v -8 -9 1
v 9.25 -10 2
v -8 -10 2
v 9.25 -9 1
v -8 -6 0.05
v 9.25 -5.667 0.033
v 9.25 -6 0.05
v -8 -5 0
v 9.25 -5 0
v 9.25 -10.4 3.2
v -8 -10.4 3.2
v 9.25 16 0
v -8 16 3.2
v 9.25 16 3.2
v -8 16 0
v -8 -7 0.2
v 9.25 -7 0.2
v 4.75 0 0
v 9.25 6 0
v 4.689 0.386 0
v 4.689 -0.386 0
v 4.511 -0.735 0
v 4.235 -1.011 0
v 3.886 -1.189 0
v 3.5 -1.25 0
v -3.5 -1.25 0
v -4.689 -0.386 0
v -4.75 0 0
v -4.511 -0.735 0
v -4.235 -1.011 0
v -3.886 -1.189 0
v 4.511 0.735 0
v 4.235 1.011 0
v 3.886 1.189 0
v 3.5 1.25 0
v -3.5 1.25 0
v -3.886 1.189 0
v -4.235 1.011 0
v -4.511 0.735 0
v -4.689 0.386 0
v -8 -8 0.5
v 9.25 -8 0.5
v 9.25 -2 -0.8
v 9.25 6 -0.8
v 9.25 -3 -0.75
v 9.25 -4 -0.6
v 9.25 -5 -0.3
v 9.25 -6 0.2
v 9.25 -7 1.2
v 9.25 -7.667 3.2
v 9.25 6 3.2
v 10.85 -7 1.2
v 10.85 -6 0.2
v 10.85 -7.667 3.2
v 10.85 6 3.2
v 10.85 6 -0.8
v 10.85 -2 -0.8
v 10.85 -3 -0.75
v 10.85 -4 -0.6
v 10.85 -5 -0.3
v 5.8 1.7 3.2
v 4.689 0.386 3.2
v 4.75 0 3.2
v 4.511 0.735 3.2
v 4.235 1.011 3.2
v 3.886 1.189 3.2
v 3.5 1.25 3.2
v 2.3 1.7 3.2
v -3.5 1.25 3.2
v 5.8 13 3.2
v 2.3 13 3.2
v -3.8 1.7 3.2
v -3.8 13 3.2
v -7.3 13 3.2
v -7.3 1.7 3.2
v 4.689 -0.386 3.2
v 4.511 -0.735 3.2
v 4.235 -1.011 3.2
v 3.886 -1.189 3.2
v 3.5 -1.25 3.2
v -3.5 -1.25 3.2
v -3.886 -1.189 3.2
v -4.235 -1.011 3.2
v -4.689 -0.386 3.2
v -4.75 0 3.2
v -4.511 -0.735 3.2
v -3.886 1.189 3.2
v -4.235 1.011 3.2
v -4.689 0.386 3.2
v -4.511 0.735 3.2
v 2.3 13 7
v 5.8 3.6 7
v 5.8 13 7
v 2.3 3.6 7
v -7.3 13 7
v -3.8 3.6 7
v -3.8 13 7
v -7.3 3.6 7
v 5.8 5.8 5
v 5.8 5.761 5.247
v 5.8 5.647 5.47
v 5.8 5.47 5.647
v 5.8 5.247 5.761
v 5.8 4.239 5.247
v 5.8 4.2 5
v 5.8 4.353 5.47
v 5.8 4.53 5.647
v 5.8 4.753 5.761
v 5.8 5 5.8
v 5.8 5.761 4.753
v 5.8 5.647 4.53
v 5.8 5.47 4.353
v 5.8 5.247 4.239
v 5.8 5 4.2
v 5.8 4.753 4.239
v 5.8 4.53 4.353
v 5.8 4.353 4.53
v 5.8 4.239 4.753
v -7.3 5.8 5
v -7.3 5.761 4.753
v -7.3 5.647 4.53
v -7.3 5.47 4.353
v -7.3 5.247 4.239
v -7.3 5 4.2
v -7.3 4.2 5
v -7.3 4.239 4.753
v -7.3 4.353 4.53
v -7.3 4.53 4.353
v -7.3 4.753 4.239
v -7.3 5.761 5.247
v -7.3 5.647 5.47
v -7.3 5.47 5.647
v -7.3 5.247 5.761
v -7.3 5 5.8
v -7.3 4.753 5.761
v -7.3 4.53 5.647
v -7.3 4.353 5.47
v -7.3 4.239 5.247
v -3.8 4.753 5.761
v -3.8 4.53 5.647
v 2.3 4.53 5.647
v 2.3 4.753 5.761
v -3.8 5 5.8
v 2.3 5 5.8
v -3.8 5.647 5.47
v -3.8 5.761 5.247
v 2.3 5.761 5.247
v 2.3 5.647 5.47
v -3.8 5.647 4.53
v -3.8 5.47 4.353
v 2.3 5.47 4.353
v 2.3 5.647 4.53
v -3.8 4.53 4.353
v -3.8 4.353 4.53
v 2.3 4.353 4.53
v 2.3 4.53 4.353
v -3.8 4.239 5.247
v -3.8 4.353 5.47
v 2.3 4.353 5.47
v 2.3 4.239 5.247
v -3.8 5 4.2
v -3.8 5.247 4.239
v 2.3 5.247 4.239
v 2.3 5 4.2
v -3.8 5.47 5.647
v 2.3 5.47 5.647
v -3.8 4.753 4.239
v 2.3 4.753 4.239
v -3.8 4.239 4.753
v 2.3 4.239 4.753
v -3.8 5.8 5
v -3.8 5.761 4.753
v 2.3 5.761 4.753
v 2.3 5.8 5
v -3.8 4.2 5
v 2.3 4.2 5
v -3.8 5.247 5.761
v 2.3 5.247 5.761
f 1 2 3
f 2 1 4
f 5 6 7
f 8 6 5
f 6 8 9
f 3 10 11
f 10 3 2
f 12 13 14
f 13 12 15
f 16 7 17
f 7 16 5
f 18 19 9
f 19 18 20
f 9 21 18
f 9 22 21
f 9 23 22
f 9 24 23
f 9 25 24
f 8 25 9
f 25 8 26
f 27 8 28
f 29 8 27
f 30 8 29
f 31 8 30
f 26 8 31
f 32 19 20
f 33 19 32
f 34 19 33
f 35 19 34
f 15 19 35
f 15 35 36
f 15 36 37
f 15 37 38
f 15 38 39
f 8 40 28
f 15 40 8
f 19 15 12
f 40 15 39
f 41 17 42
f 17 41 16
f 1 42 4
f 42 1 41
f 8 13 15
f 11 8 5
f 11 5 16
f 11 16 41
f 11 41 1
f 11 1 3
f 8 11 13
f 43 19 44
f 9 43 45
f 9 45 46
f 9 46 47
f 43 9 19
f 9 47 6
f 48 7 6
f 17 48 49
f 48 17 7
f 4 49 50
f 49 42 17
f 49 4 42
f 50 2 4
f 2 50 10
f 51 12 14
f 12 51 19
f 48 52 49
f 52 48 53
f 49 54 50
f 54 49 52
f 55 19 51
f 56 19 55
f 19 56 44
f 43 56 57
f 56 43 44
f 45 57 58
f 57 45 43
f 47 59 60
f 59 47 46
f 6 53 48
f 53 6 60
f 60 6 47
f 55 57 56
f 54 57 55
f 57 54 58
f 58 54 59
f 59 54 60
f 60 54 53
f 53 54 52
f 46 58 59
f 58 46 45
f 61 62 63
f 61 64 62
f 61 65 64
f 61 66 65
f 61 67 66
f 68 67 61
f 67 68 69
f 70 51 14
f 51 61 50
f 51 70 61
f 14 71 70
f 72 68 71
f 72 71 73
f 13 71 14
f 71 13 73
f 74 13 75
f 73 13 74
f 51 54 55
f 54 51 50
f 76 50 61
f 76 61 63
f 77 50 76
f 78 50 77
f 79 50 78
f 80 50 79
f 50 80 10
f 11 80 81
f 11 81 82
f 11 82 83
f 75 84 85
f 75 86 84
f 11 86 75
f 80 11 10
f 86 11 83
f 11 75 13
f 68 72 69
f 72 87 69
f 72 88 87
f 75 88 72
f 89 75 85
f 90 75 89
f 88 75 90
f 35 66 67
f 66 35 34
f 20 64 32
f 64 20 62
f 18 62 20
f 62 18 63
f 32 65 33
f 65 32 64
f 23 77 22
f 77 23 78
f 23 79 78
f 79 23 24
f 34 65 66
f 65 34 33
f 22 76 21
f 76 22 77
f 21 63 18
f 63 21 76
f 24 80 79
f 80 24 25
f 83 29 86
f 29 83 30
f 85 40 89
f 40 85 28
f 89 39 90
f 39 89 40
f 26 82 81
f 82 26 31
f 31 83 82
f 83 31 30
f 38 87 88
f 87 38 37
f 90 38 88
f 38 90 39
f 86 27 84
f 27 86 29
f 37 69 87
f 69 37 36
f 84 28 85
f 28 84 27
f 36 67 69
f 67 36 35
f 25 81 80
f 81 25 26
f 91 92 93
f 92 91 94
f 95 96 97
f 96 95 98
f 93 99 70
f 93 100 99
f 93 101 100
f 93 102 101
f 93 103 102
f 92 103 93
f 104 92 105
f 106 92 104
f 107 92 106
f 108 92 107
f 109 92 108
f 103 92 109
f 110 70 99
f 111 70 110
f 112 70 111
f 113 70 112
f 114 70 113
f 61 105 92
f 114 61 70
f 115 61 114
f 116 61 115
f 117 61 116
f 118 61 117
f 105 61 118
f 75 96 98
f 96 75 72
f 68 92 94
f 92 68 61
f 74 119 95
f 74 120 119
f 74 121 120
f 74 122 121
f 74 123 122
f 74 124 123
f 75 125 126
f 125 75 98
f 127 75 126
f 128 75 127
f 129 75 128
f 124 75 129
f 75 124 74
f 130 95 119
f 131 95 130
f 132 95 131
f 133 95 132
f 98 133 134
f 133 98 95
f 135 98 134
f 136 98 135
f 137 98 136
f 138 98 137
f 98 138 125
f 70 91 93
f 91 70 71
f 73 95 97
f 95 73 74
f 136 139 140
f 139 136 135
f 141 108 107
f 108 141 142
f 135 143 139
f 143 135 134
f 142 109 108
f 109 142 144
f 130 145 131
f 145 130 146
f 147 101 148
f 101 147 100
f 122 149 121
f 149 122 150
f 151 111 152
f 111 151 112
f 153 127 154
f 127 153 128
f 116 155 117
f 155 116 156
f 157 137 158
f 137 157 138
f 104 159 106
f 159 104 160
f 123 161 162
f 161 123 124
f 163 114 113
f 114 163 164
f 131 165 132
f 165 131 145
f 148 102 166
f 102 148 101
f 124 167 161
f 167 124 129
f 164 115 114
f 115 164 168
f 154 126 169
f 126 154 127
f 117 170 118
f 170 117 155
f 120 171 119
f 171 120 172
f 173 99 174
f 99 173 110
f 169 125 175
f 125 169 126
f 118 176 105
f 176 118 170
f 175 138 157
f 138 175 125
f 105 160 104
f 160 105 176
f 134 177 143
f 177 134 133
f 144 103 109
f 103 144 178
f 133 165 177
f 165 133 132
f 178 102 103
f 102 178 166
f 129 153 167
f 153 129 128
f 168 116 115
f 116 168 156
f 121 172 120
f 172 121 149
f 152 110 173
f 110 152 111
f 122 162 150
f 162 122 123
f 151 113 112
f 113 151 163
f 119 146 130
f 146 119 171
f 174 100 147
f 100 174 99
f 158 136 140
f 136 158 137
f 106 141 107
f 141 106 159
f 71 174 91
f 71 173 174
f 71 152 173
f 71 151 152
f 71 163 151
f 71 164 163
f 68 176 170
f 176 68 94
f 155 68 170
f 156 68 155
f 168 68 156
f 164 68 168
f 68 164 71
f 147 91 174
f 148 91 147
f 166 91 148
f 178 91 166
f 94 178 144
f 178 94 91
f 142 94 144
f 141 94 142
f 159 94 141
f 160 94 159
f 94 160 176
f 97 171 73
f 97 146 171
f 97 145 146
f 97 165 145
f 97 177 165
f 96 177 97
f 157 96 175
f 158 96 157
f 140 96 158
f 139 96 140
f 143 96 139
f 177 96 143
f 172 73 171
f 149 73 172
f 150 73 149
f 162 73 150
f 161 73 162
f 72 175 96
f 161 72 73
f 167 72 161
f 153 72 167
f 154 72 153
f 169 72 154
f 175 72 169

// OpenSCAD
// file: guided_sewing_foot_template.scad
// The diameter of the MATIC rod
matic_rod_diameter = 1.6;

// The height at which the MATIC rod is placed over the plate (the least strict parameter, as the foot is amortized)
matic_rod_dz = 5.0; 

// The Y offset between the MATIC rod and the needle
matic_offset_dy = 5.0;

// The total width of the MATIC handle (including allowance)
matic_handle_width = 6.1; 

// The X offset between the needle and the center of the MATIC handle on Janome machines with a maximum stitch width of 7 mm 
janome_matic_offset_dx = -0.75;

// The width of the transport mechanism in the Janome machines
janome_transport_width = 16.0;

needle_tunnel_length_max = 7.0;
needle_tunnel_margin = 4.0;

foot_base_leftside_width = janome_transport_width / 2;
foot_base_rightside_width_full = janome_transport_width / 2;

guide_min_width = 1.6;
ear_width = 3.5;

foot_base_height = 3.2;

primary_front_length = 5.0;
primary_back_length = 16.0;

short_guide_front_length = 2.0;
short_guide_back_length = 6.0;

ears_piece_width = matic_handle_width + ear_width * 2;
right_ear_edge_x = janome_matic_offset_dx + matic_handle_width / 2 + ear_width;

module reflection(
    mirror_vector = [1, 0, 0]
) {
    union() {
        children();
        mirror(mirror_vector) {
            children();
        }
    }
}

module make_wing(
    width,
    front_length,
    back_length,
) {
    h_max = 5.0;
    dx = 1;
    
    rotate([180, -90, 0])
    linear_extrude(height=width)
    polygon(
        points=[
            [h_max, -back_length],
            [0, -back_length],
            [0.00, front_length + dx * 0],
            [0.05, front_length + dx * 1],
            [0.20, front_length + dx * 2],
            [0.50, front_length + dx * 3],
            [1.00, front_length + dx * 4],
            [2.00, front_length + dx * 5],
            [h_max, front_length + dx * 6]
        ],
        paths=[
            [0, 1, 2, 3, 4, 5, 6, 7, 8],
        ]
    );
}

module top_cutter_global() {
    a = 40;
    h = 20;
    
    translate([-a / 2, -a / 2, foot_base_height])
    cube([a, a, h]);
}

module ears_piece_base_local() {
    back_length = 8.0;
    height = 4.0;
    
    translate([-ears_piece_width/2, 0, 0])
    rotate([180, -90, 0])
    linear_extrude(height=ears_piece_width)
    polygon(
        points=[
            [height / 2, -back_length],
            [-height / 2, -back_length],
            [-height / 2, 3.4],
            [height / 2, 1.4],
        ],
        paths=[
            [0, 1, 2, 3],
        ]
    );
}

module matic_rod_cutter_local() {
    length = 40;
    
    translate([-length / 2, 0, 0])
    rotate([180, -90, 0])
    cylinder(h = length, r = matic_rod_diameter / 2, $fn = 20);
}

module matic_handle_cutter_local() {
    a = matic_handle_width;
    h = 30;
    
    translate([-a / 2, -h / 2, -h / 2])
    cube([a, h, h]);
}

module ears_piece_local() {
    difference() {
        difference() {
            ears_piece_base_local();
            matic_rod_cutter_local();
        }
        matic_handle_cutter_local();
    }
}

module ears_piece_global() {
    translate([
        janome_matic_offset_dx,
        matic_offset_dy,
        matic_rod_dz,
    ])
    ears_piece_local();
}

module make_needle_tunnel_cutter(
    length,
    width,
) {
    height = 10;

    translate([0, 0, -height / 2]) {
        translate([-length / 2, -width / 2, 0])
        cube([length, width, height]);

        reflection([1, 0, 0]) {
            translate([length / 2, 0, 0])
            cylinder(h = height, r = width / 2, $fn = 20);
        }
    }
}

module make_guided_foot(
    // The distance between the needle and the guide
    guide_offset,
    guide_depth = 0.8,
    use_full_width = true,
    use_full_length = false,
) {
    guide_front_length = use_full_length ? primary_front_length : short_guide_front_length;
    guide_back_length = use_full_length ? primary_back_length : short_guide_back_length;

    foot_base_rightside_width_free = use_full_width ? foot_base_rightside_width_full : right_ear_edge_x;
    foot_base_rightside_width = max(guide_offset, foot_base_rightside_width_free);
    guide_width = max(foot_base_rightside_width - guide_offset, guide_min_width);

    // The nominal lenth of the needle tunnel (the maximal usable stich width)
    needle_tunnel_length_safe = (foot_base_rightside_width - needle_tunnel_margin) * 2;
    needle_tunnel_length = min(needle_tunnel_length_safe, needle_tunnel_length_max);

    module foot_base_global() {
        translate([-foot_base_leftside_width, 0, 0])
        make_wing(
            width = foot_base_leftside_width + foot_base_rightside_width,
            front_length = primary_front_length,
            back_length = primary_back_length
        );
    }

    module guide_global() {
        translate([guide_offset, 0, -guide_depth])
        make_wing(
            width = guide_width,
            front_length = guide_front_length,
            back_length = guide_back_length
        );
    }

    module guided_foot_global() {
        difference() {
            difference() {
                union() {
                    foot_base_global();
                    guide_global();
                }

                top_cutter_global();
            };

            needle_tunnel_cutter_global();
        }

        ears_piece_global();
    }

    module needle_tunnel_cutter_global() {
        make_needle_tunnel_cutter(
            length = needle_tunnel_length,
            width = 2.5
        );
    }

    guided_foot_global();
}
// main file
include <guided_sewing_foot_template.scad>;

make_guided_foot(
    guide_offset = 9.25
);
